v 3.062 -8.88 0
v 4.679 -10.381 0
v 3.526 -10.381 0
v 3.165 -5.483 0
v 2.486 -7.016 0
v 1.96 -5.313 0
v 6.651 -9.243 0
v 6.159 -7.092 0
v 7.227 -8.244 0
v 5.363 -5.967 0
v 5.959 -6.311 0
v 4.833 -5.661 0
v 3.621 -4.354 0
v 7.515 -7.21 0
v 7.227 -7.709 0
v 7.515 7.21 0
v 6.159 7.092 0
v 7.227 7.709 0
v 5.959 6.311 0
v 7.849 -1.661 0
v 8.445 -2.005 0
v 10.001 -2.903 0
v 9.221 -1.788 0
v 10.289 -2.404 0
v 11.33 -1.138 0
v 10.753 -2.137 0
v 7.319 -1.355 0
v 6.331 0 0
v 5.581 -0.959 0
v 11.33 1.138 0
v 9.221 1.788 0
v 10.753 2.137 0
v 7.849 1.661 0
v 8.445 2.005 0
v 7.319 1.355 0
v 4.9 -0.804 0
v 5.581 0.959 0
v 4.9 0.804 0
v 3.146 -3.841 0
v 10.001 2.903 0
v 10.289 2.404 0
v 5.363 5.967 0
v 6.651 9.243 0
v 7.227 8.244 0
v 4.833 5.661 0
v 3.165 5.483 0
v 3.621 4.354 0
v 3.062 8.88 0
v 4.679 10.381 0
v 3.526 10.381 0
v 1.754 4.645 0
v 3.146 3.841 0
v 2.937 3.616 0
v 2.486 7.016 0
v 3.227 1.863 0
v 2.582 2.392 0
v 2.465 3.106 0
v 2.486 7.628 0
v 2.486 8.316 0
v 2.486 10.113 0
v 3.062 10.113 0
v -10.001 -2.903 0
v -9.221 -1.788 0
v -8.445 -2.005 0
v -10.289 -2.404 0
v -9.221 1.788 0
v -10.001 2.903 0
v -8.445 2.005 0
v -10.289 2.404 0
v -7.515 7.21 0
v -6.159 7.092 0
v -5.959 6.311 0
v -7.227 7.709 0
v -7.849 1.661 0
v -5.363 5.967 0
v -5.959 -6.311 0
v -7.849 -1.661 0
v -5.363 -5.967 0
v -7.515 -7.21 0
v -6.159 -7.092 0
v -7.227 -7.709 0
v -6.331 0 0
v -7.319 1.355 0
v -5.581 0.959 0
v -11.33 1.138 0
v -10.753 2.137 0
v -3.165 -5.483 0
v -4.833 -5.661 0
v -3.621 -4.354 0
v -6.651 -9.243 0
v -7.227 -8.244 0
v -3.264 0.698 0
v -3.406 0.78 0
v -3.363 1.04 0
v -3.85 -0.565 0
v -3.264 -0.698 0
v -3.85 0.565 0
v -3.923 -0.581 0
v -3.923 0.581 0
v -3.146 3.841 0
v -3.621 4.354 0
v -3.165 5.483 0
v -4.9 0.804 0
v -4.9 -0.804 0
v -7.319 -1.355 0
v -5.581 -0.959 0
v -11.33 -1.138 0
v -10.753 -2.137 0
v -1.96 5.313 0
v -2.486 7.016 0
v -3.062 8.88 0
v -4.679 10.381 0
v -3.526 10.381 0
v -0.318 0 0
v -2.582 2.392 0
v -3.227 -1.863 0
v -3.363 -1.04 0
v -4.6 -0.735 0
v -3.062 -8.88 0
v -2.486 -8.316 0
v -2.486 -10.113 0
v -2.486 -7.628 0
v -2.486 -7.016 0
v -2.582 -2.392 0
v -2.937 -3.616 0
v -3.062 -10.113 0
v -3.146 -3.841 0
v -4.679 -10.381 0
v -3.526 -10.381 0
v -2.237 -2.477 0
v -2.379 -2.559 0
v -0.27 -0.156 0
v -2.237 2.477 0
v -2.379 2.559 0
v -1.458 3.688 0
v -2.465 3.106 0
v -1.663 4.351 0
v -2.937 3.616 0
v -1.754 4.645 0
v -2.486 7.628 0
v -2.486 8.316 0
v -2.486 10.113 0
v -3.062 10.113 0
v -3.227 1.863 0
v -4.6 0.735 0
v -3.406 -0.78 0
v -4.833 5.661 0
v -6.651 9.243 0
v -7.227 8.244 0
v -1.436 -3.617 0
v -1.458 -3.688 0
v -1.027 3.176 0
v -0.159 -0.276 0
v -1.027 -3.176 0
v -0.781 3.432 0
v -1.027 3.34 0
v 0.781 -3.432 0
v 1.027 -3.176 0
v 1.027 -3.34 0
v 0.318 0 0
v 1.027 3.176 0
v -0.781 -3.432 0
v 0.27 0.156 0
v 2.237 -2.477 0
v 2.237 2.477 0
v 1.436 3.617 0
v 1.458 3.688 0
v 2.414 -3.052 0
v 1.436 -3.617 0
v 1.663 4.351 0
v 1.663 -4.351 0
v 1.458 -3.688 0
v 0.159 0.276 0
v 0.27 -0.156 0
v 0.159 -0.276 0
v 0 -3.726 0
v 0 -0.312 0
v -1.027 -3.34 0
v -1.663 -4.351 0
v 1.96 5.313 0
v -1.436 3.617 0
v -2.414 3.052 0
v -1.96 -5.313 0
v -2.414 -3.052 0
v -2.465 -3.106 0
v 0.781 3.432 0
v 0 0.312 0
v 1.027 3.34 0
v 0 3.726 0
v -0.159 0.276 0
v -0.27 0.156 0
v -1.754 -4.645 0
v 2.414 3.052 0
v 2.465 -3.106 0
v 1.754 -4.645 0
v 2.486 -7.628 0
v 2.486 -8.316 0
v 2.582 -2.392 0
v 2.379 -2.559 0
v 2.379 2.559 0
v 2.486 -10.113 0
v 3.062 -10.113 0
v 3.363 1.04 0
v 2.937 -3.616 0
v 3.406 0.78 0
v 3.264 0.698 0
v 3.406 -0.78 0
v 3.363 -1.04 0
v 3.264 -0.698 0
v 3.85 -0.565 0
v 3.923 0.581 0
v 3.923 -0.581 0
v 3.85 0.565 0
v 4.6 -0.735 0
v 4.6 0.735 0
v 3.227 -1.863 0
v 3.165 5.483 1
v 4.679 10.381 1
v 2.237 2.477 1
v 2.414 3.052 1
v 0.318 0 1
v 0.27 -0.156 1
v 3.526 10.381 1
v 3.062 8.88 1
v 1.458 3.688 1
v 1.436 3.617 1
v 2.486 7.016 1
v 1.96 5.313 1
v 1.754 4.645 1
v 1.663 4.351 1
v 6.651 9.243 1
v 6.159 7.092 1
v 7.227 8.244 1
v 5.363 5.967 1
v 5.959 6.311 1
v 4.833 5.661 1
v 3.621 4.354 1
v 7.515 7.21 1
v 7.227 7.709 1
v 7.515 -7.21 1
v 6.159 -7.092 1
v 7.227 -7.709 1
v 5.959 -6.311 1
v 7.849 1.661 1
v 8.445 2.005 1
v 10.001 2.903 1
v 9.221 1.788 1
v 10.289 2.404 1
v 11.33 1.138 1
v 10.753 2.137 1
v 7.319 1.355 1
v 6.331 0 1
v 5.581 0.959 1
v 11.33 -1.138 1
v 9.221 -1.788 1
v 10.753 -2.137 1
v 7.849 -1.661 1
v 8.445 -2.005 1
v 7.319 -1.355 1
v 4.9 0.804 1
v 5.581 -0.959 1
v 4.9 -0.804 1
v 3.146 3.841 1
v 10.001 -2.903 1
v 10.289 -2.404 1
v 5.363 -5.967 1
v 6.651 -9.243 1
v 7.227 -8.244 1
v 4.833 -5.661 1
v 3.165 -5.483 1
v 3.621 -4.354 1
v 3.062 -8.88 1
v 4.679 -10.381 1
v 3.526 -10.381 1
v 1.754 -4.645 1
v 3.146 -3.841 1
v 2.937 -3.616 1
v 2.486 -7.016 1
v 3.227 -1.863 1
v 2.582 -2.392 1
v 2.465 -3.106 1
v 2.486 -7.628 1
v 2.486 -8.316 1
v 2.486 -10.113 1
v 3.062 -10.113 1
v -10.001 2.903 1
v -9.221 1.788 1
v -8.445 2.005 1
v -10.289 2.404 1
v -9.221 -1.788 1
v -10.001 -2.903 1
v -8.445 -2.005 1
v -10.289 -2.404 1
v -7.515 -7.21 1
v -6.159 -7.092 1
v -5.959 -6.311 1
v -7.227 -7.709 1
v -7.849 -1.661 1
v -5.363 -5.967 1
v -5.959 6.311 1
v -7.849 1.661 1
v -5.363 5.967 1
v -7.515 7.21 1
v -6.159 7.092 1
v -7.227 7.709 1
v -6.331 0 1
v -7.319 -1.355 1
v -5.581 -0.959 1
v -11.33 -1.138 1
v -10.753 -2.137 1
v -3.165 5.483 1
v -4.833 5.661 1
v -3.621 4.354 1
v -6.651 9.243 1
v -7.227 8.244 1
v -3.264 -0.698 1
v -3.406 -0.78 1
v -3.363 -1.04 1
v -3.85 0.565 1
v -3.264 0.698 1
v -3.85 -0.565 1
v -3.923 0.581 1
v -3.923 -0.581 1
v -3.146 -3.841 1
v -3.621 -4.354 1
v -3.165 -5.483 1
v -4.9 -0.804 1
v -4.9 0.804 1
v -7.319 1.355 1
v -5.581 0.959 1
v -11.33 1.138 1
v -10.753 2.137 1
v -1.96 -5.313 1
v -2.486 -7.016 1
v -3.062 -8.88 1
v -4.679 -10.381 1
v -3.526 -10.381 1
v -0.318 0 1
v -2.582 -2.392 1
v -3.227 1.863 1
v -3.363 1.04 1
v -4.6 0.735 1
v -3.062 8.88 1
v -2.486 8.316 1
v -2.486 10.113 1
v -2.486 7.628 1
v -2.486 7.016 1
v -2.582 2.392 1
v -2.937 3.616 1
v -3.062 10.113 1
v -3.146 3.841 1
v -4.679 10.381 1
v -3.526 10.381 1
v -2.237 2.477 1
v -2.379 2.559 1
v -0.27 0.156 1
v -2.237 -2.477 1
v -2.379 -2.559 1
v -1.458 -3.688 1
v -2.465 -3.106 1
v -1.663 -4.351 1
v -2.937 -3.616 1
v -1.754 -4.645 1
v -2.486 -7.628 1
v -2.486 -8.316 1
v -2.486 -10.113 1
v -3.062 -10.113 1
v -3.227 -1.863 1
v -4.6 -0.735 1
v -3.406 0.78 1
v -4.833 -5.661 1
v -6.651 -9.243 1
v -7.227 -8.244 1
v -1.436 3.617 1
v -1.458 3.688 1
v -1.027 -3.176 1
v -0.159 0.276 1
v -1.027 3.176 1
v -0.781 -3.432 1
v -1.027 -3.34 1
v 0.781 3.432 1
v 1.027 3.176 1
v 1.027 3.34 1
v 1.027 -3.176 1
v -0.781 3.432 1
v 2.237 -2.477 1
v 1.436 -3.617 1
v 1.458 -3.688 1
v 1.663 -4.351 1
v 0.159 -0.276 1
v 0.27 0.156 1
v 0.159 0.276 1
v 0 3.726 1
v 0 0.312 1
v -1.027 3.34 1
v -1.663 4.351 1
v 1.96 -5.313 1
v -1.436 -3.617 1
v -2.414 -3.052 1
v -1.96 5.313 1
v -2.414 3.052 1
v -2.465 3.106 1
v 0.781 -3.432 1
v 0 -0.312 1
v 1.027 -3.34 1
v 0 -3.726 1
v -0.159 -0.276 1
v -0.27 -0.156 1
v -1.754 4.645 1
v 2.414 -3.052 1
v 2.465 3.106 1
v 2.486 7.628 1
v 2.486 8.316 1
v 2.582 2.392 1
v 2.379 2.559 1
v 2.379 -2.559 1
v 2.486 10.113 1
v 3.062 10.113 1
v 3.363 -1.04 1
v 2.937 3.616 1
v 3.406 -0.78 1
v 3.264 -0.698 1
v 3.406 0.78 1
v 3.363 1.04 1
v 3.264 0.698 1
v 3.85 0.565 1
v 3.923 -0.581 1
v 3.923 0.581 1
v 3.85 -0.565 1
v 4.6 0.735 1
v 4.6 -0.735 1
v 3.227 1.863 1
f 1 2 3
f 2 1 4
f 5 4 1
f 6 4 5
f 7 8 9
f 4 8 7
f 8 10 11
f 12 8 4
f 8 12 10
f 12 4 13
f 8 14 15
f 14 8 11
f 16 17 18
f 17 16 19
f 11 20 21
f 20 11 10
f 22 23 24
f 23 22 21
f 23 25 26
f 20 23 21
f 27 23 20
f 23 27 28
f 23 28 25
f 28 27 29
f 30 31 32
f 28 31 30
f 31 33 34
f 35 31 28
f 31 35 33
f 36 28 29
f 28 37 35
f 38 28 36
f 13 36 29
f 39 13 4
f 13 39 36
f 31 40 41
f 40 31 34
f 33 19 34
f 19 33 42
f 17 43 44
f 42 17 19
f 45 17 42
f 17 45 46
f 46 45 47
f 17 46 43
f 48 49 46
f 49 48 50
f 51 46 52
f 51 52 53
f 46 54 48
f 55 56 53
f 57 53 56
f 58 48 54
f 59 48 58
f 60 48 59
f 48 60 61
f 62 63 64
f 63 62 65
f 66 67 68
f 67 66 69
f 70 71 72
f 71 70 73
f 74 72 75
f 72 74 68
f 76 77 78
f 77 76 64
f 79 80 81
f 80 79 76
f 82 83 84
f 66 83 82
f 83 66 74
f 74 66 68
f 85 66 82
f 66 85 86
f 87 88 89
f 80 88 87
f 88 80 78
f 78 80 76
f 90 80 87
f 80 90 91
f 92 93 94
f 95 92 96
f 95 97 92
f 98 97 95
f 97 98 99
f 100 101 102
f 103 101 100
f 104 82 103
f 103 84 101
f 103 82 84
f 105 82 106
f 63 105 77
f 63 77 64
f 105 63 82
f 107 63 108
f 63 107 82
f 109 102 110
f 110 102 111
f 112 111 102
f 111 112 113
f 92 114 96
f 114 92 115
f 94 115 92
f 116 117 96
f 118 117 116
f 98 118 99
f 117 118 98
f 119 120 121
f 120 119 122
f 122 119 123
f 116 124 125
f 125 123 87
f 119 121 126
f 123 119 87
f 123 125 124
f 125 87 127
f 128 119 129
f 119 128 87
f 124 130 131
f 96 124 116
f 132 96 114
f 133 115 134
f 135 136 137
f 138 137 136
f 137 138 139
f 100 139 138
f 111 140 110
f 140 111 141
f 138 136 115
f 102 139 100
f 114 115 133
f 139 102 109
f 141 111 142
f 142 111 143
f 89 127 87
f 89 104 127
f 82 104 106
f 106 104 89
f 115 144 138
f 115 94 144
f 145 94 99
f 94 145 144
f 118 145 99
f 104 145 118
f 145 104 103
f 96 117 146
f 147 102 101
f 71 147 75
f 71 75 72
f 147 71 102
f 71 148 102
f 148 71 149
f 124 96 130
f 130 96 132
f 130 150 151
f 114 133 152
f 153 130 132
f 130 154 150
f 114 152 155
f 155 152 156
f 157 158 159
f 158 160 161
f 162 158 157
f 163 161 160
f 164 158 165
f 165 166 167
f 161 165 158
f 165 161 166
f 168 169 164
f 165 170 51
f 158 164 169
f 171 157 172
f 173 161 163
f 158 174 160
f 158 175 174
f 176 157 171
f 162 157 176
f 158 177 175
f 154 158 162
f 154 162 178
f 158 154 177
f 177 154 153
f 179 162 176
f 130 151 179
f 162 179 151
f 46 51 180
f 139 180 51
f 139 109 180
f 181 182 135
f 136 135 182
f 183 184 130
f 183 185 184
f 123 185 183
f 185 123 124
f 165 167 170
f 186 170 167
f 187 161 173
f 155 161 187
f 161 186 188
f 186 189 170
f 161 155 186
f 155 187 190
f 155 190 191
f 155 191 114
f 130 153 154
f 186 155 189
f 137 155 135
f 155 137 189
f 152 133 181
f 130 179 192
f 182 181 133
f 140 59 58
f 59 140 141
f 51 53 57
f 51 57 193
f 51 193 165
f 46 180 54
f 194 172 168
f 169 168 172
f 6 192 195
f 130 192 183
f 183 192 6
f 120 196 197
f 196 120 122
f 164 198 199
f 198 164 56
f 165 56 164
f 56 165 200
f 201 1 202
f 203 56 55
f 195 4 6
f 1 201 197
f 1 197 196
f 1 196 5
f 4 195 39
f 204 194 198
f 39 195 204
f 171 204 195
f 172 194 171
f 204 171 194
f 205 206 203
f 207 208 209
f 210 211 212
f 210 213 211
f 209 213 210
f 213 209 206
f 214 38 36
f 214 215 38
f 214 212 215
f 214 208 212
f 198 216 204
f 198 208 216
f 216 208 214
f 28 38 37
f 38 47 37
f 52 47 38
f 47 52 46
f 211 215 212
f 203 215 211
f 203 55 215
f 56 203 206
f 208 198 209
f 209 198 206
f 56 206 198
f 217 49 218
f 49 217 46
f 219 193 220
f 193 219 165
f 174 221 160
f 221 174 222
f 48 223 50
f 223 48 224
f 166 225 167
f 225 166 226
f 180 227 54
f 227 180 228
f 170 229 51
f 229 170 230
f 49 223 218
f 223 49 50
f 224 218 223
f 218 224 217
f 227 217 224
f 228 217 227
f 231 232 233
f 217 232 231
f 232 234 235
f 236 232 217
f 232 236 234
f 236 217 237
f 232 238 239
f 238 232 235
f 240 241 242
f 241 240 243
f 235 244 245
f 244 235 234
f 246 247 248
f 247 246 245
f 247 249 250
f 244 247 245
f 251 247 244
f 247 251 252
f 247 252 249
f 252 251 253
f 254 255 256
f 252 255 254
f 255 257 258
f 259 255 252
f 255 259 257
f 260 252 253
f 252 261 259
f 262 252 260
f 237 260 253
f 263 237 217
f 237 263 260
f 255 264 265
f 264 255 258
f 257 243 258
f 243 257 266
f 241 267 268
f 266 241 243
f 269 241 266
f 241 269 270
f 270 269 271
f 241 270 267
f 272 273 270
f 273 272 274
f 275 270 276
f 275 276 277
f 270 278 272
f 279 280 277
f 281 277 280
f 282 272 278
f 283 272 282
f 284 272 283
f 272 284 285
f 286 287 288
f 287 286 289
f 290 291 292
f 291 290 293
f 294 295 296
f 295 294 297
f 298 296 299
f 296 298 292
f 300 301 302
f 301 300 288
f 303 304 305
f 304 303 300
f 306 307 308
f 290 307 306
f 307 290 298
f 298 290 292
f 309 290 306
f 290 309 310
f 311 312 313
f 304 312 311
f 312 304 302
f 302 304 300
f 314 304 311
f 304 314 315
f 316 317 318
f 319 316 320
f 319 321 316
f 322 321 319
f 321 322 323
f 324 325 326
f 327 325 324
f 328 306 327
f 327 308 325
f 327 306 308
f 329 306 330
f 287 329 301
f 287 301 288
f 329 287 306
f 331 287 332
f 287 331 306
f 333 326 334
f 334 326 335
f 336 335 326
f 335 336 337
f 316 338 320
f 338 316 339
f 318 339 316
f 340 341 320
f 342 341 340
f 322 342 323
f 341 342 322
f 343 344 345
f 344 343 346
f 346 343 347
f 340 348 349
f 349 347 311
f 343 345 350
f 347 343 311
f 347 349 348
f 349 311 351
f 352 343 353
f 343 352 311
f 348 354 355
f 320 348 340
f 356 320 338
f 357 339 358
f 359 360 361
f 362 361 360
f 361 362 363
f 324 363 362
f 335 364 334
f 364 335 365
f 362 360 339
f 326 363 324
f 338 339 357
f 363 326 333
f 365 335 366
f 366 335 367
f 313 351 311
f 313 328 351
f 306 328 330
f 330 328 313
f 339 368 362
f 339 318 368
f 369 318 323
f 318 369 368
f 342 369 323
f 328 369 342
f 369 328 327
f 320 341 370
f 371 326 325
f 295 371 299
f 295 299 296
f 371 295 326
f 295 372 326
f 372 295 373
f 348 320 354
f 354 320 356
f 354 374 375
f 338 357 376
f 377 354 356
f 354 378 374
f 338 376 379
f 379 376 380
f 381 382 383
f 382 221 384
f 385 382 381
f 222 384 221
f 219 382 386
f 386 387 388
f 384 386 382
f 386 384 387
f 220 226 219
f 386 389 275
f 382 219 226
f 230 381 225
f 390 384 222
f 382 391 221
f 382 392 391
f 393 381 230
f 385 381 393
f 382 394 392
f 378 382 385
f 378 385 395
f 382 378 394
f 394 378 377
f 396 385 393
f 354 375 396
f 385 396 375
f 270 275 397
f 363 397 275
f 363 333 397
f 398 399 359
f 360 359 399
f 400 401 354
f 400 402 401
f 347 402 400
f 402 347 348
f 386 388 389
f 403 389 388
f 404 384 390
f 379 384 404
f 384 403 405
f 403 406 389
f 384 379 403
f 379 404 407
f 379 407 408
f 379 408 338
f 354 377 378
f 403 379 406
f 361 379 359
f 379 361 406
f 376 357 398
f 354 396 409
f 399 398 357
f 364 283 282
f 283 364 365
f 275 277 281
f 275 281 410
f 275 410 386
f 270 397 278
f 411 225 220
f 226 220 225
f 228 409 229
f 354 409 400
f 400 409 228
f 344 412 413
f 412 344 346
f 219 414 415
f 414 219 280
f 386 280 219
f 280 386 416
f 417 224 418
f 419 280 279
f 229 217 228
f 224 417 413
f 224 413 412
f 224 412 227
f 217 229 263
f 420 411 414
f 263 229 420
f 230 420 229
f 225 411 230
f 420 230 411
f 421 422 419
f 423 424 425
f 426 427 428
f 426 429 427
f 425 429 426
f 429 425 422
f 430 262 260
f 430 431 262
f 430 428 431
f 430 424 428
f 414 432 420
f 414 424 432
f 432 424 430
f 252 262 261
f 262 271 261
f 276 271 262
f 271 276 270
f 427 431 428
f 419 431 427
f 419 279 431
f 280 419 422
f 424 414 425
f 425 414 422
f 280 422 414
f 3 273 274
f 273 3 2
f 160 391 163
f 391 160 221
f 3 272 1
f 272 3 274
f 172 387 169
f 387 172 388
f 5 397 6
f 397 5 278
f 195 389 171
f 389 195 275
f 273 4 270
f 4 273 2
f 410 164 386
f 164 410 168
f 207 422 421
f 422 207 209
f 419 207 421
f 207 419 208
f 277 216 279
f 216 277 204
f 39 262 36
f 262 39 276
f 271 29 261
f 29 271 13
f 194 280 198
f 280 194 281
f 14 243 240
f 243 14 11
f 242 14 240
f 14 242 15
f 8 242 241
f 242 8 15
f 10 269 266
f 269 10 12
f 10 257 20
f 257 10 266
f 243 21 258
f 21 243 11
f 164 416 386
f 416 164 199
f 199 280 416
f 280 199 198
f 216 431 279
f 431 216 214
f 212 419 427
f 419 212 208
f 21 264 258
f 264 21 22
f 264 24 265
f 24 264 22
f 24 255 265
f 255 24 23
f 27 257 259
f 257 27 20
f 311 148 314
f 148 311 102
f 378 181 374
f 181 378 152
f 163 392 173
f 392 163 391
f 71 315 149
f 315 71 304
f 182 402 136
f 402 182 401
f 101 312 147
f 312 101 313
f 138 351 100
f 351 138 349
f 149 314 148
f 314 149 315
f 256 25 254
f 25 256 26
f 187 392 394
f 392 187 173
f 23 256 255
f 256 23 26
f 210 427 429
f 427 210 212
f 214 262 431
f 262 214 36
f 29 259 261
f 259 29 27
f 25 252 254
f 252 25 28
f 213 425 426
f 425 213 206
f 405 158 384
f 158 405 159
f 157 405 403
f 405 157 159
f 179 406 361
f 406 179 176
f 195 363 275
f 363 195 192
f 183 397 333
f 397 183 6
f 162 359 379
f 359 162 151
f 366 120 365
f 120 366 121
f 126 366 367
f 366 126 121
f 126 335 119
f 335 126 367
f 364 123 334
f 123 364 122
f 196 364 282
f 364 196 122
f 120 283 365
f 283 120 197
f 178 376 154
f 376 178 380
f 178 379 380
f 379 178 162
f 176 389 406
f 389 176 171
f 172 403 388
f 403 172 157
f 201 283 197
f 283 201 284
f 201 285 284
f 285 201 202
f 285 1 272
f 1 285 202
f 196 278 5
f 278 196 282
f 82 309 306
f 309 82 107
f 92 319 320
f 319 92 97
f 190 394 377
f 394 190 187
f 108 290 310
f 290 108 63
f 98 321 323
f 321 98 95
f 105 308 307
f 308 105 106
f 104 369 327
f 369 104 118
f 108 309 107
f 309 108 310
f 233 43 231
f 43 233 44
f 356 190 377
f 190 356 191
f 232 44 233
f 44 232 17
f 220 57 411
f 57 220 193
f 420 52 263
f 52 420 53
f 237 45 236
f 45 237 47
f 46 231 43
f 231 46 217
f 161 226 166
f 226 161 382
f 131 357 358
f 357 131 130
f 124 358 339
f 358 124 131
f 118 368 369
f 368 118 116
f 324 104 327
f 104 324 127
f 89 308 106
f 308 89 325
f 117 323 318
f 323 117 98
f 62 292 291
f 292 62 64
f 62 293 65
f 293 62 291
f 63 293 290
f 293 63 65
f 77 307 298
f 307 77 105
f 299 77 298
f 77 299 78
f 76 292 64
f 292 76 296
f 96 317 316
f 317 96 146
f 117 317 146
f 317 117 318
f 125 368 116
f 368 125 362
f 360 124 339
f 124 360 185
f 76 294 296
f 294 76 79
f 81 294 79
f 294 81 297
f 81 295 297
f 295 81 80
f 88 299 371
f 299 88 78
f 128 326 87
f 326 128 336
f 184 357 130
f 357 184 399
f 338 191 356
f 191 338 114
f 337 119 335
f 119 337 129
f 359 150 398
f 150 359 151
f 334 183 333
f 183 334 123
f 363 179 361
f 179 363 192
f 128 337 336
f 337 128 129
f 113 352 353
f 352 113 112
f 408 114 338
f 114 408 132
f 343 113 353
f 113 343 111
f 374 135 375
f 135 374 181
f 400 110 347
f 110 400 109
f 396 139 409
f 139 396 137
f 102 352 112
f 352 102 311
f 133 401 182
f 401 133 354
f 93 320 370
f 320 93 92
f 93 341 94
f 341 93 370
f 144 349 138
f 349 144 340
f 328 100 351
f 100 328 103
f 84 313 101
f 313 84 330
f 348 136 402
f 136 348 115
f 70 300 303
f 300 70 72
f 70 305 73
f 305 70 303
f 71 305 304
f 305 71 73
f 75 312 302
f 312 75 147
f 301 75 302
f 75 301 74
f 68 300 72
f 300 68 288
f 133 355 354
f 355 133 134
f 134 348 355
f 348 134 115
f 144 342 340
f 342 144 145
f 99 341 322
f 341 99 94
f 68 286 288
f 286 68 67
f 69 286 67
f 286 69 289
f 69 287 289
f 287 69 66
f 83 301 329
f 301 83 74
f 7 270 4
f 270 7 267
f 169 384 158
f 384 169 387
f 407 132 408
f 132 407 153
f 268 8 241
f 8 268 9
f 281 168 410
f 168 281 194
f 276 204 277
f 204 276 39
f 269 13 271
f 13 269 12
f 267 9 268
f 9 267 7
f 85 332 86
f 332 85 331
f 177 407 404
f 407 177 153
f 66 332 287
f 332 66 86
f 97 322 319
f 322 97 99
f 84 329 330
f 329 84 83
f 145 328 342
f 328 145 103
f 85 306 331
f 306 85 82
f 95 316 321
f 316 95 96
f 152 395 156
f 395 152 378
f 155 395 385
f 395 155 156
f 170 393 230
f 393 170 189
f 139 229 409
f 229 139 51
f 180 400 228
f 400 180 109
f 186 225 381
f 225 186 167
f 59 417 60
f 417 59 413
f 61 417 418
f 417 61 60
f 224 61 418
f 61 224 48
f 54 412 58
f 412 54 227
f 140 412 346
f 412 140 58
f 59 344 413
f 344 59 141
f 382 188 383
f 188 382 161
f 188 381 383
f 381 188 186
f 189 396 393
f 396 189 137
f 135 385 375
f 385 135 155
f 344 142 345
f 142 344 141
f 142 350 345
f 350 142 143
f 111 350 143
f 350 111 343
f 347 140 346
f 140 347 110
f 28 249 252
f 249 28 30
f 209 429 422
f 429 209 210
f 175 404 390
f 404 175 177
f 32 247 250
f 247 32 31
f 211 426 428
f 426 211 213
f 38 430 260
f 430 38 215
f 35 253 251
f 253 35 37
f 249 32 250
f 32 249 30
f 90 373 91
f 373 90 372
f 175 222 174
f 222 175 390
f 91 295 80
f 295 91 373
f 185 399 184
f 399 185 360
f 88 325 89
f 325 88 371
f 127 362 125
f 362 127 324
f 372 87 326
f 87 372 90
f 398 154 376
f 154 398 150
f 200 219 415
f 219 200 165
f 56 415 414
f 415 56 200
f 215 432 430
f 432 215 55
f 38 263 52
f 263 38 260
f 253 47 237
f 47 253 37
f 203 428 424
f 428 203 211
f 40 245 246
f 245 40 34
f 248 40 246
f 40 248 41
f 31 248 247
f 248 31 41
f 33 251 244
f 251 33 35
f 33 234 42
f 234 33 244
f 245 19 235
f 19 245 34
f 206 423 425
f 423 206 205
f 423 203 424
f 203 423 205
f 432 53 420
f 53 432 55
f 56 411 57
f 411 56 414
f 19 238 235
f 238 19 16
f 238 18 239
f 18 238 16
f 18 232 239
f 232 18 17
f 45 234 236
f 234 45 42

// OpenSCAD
// preview[view:south, tilt:top]
/* [Main Text] */
//To input the backslash type '\\'
main_text = "/";
main_text_size = 10;
main_text_vertical_offset = -1;
//See http://www.google.com/fonts. Handwriting fonts look the best for this thing.
main_font = "Great Vibes"; //[ABeeZee,Abel,Abril Fatface,Aclonica,Acme,Actor,Adamina,Advent Pro,Aguafina Script,Akronim,Aladin,Aldrich,Alef,Alegreya,Alegreya Sans,Alegreya Sans SC,Alegreya SC,Alex Brush,Alfa Slab One,Alice,Alike,Alike Angular,Allan,Allerta,Allerta Stencil,Allura,Almendra,Almendra Display,Almendra SC,Amarante,Amaranth,Amatic SC,Amethysta,Amiri,Anaheim,Andada,Andada SC,Andika,Angkor,Annie Use Your Telescope,Anonymous Pro,Antic,Antic Didone,Antic Slab,Anton,Antonio,Arapey,Arbutus,Arbutus Slab,Architects Daughter,Archivo Black,Archivo Narrow,Arimo,Arizonia,Armata,Artifika,Arvo,Asap,Asset,Astloch,Asul,Atomic Age,Aubrey,Audiowide,Autour One,Average,Average Sans,Averia Gruesa Libre,Averia Libre,Averia Sans Libre,Averia Serif Libre,Bad Script,Balthazar,Bangers,Basic,Battambang,Baumans,Bayon,Belgrano,Belleza,BenchNine,Bentham,Berkshire Swash,Bevan,Bhavuka,Bigelow Rules,Bigshot One,Bilbo,Bilbo Swash Caps,Bitter,Black Ops One,Bokor,Bonbon,Boogaloo,Bowlby One,Bowlby One SC,Brawler,Bree Serif,Bruno Ace,Bruno Ace SC,Bubblegum Sans,Bubbler One,Buda,Buenard,Butcherman,Butcherman Caps,Butterfly Kids,Cabin,Cabin Condensed,Cabin Sketch,Caesar Dressing,Cagliostro,Calligraffitti,Cambay,Cambo,Candal,Cantarell,Cantata One,Cantora One,Capriola,Cardo,Carme,Carrois Gothic,Carrois Gothic SC,Carter One,Caudex,Cedarville Cursive,Ceviche One,Changa,Changa One,Chango,Chau Philomene One,Chela One,Chelsea Market,Chenla,Cherry Cream Soda,Cherry Swash,Chewy,Chicle,Chivo,Cinzel,Cinzel Decorative,Clara,Clicker Script,Coda,Coda Caption,Codystar,Combo,Comfortaa,Coming Soon,Concert One,Condiment,Content,Contrail One,Convergence,Cookie,Copse,Corben,Courgette,Cousine,Coustard,Covered By Your Grace,Crafty Girls,Creepster,Creepster Caps,Crete Round,Crimson Text,Croissant One,Crushed,Cuprum,Cutive,Cutive Mono,Damion,Dancing Script,Dangrek,Dawning of a New Day,Days One,Dekko,Delius,Delius Swash Caps,Delius Unicase,Della Respira,Denk One,Devonshire,Dhurjati,Dhyana,Didact Gothic,Dinah,Diplomata,Diplomata SC,Domine,Donegal One,Doppio One,Dorsa,Dosis,Droid Arabic Kufi,Droid Arabic Naskh,Droid Sans,Droid Sans Ethiopic,Droid Sans Mono,Droid Sans Thai,Droid Serif,Droid Serif Thai,Dr Sugiyama,Duru Sans,Dynalight,Eagle Lake,Eater,Eater Caps,EB Garamond,Economica,Eczar,Ek Mukta,Electrolize,Elsie,Elsie Swash Caps,Emblema One,Emilys Candy,Encode Sans,Encode Sans Compressed,Encode Sans Condensed,Encode Sans Narrow,Encode Sans Wide,Engagement,Englebert,Enriqueta,Erica One,Esteban,Euphoria Script,Ewert,Exo,Exo 2,Expletus Sans,Fanwood Text,Fascinate,Fascinate Inline,Faster One,Fasthand,Fauna One,Federant,Federo,Felipa,Fenix,Finger Paint,Fira Mono,Fira Sans,Fjalla One,Fjord One,Flamenco,Flavors,Fondamento,Fontdiner Swanky,Forum,Francois One,Freckle Face,Fredericka the Great,Fredoka One,Freehand,Fresca,Frijole,Fruktur,Fugaz One,Gabriela,Gafata,Galdeano,Galindo,Gentium Basic,Gentium Book Basic,Geo,Geostar,Geostar Fill,Germania One,GFS Didot,GFS Neohellenic,Gidugu,Gilda Display,Give You Glory,Glass Antiqua,Glegoo,Gloria Hallelujah,Goblin One,Gochi Hand,Gorditas,Goudy Bookletter 1911,Graduate,Grand Hotel,Gravitas One,Great Vibes,Griffy,Gruppo,Gudea,Gurajada,Habibi,Halant,Hammersmith One,Hanalei,Hanalei Fill,Handlee,Hanuman,Happy Monkey,Headland One,Henny Penny,Hermeneus One,Herr Von Muellerhoff,Hind,Holtwood One SC,Homemade Apple,Homenaje,Iceberg,Iceland,IM Fell Double Pica,IM Fell Double Pica SC,IM Fell DW Pica,IM Fell DW Pica SC,IM Fell English,IM Fell English SC,IM Fell French Canon,IM Fell French Canon SC,IM Fell Great Primer,IM Fell Great Primer SC,Imprima,Inconsolata,Inder,Indie Flower,Inika,Inknut Antiqua,Irish Grover,Irish Growler,Istok Web,Italiana,Italianno,Jacques Francois,Jacques Francois Shadow,Jaldi,Jim Nightshade,Jockey One,Jolly Lodger,Josefin Sans,Josefin Sans Std Light,Josefin Slab,Joti One,Judson,Julee,Julius Sans One,Junge,Jura,Just Another Hand,Just Me Again Down Here,Kadwa,Kalam,Kameron,Kantumruy,Karla,Karla Tamil Inclined,Karla Tamil Upright,Karma,Kaushan Script,Kavoon,Kdam Thmor,Keania One,Kelly Slab,Kenia,Khand,Khmer,Khula,Kite One,Knewave,Kotta One,Koulen,Kranky,Kreon,Kristi,Krona One,La Belle Aurore,Laila,Lakki Reddy,Lancelot,Lateef,Lato,League Script,Leckerli One,Ledger,Lekton,Lemon,Lemon One,Liberation Sans ,Libre Baskerville,Libre Caslon Text,Life Savers,Lilita One,Lily Script One,Limelight,Linden Hill,Lobster,Lobster Two,Lohit Bengali,Lohit Tamil,Londrina Outline,Londrina Shadow,Londrina Sketch,Londrina Solid,Lora,Loved by the King,Lovers Quarrel,Love Ya Like A Sister,Luckiest Guy,Lusitana,Lustria,Macondo,Macondo Swash Caps,Magra,Maiden Orange,Mako,Mallanna,Mandali,Marcellus,Marcellus SC,Marck Script,Margarine,Marko One,Marmelad,Martel Sans,Marvel,Mate,Mate SC,Maven Pro,McLaren,Meddon,MedievalSharp,Medula One,Megrim,Meie Script,Merge One,Merienda,Merienda One,Merriweather,Merriweather Sans,Mervale Script,Metal,Metal Mania,Metamorphous,Metrophobic,Miama,Michroma,Milonga,Miltonian,Miltonian Tattoo,Miniver,Miss Fajardose,Miss Saint Delafield,Modak,Modern Antiqua,Molengo,Molle,Monda,Monofett,Monoton,Monsieur La Doulaise,Montaga,Montez,Montserrat,Montserrat Alternates,Montserrat Subrayada,Moul,Moulpali,Mountains of Christmas,Mouse Memoirs,Mr Bedford,Mr Bedfort,Mr Dafoe,Mr De Haviland,Mrs Sheppards,Mrs Saint Delafield,Muli,Mystery Quest,Nanum Brush Script,Nanum Gothic,Nanum Gothic Coding,Nanum Myeongjo,Nanum Pen Script,NATS,Neucha,Neuton,New Rocker,News Cycle,Niconne,Nixie One,Nobile,Nokora,Norican,Nosifer,Nosifer Caps,Nothing You Could Do,Noticia Text,Noto Sans,Noto Sans Hebrew,Noto Sans Symbols,Noto Sans UI,Noto Serif,Nova Cut,Nova Flat,Nova Mono,Nova Oval,Nova Round,Nova Script,Nova Slim,Nova Square,NTR,Numans,Nunito,Odor Mean Chey,Offside,OFL Sorts Mill Goudy TT,Oldenburg,Old Standard TT,Oleo Script,Oleo Script Swash Caps,Open Sans,Open Sans Condensed,Oranienbaum,Orbitron,Oregano,Orienta,Original Surfer,Oswald,Overlock,Overlock SC,Over the Rainbow,Ovo,Oxygen,Oxygen Mono,Pacifico,Palanquin,Palanquin Dark,Paprika,Parisienne,Passero One,Passion One,Pathway Gothic One,Patrick Hand,Patrick Hand SC,Patua One,Paytone One,Pecita,Peddana,Peralta,Permanent Marker,Petit Formal Script,Petrona,Phetsarath,Philosopher,Piedra,Pinyon Script,Pirata One,Plaster,Play,Playball,Playfair Display,Playfair Display SC,Podkova,Poetsen One,Poiret One,Poller One,Poly,Pompiere,Ponnala,Pontano Sans,Poppins,Porter Sans Block,Port Lligat Sans,Port Lligat Slab,Prata,Preahvihear,Press Start 2P,Princess Sofia,Prociono,Prosto One,PT Mono,PT Sans,PT Sans Caption,PT Sans Narrow,PT Serif,PT Serif Caption,Puralecka Narrow,Puritan,Purple Purse,Quando,Quantico,Quattrocento,Quattrocento Sans,Questrial,Quicksand,Quintessential,Qwigley,Racing Sans One,Radley,Rajdhani,Raleway,Raleway Dots,Ramabhadra,Ramaraja,Rambla,Rammetto One,Ranchers,Rancho,Ranga,Rationale,Ravi Prakash,Redacted,Redacted Script,Redressed,Reenie Beanie,Revalia,Ribeye,Ribeye Marrow,Righteous,Risque,Roboto,Roboto Condensed,Roboto Slab,Rochester,Rock Salt,Rokkitt,Romanesco,Ropa Sans,Rosario,Rosarivo,Rouge Script,Rozha One,Rubik Mono One,Rubik One,Ruda,Rufina,Ruge Boogie,Ruluko,Rum Raisin,Ruslan Display,Russo One,Ruthie,Rye,Sacramento,Sail,Salsa,Sanchez,Sancreek,Sansation,Sansita One,Sarabun,Sarala,Sarina,Sarpanch,Satisfy,Scada,Scheherazade,Schoolbell,Seaweed Script,Sedan,Sedan SC,Sevillana,Seymour One,Shadows Into Light,Shadows Into Light Two,Shanti,Share,Share Tech,Share Tech Mono,Shojumaru,Short Stack,Siamreap,Siemreap,Sigmar One,Signika,Signika Negative,Simonetta,Sintony,Sirin Stencil,Six Caps,Skranji,Slabo 13px,Slabo 27px,Slackey,Smokum,Smythe,Sniglet,Snippet,Snowburst One,Sofadi One,Sofia,Sonsie One,Sorts Mill Goudy,Source Code Pro,Source Sans Pro,Source Serif Pro,Special Elite,Spicy Rice,Spinnaker,Spirax,Squada One,Sree Krushnadevaraya,Stalemate,Stalinist One,Stalin One,Stardos Stencil,Stint Ultra Condensed,Stint Ultra Expanded,Stoke,Strait,Strong,Sue Ellen Francisco,Sunshiney,Supermercado One,Suranna,Suravaram,Suwannaphum,Swanky and Moo Moo,Syncopate,Tangerine,Taprom,Tauri,Teko,Telex,Tenali Ramakrishna,Tenor Sans,Terminal Dosis,Terminal Dosis Light,Text Me One,Thabit,The Girl Next Door,Tienne,Tillana,Timmana,Tinos,Titan One,Titillium Web,Trade Winds,Trocchi,Trochut,Trykker,Tuffy,Tulpen One,Ubuntu,Ubuntu Condensed,Ubuntu Mono,Ultra,Uncial Antiqua,Underdog,Unica One,UnifrakturCook,UnifrakturMaguntia,Unkempt,Unlock,Unna,Vampiro One,Varela,Varela Round,Vast Shadow,Vesper Libre,Vibur,Vidaloka,Viga,Voces,Volkhov,Vollkorn,Voltaire,VT323,Waiting for the Sunrise,Wallpoet,Walter Turncoat,Warnes,Wellfleet,Wendy One,Wire One,Yanone Kaffeesatz,Yellowtail,Yeseva One,Yesteryear,Zeyada]
main_text_style =  "";//[:Normal,style=Italic:Italic,style=Bold:Bold]
/* [Additional Text] */
//To input the backslash type '\\'
additional_text = "MT";
additional_text_size = 5;
additional_text_vertical_offset = -2;
//See http://www.google.com/fonts. Handwriting fonts look the best for this thing.
additional_font = "Great Vibes"; //[ABeeZee,Abel,Abril Fatface,Aclonica,Acme,Actor,Adamina,Advent Pro,Aguafina Script,Akronim,Aladin,Aldrich,Alef,Alegreya,Alegreya Sans,Alegreya Sans SC,Alegreya SC,Alex Brush,Alfa Slab One,Alice,Alike,Alike Angular,Allan,Allerta,Allerta Stencil,Allura,Almendra,Almendra Display,Almendra SC,Amarante,Amaranth,Amatic SC,Amethysta,Amiri,Anaheim,Andada,Andada SC,Andika,Angkor,Annie Use Your Telescope,Anonymous Pro,Antic,Antic Didone,Antic Slab,Anton,Antonio,Arapey,Arbutus,Arbutus Slab,Architects Daughter,Archivo Black,Archivo Narrow,Arimo,Arizonia,Armata,Artifika,Arvo,Asap,Asset,Astloch,Asul,Atomic Age,Aubrey,Audiowide,Autour One,Average,Average Sans,Averia Gruesa Libre,Averia Libre,Averia Sans Libre,Averia Serif Libre,Bad Script,Balthazar,Bangers,Basic,Battambang,Baumans,Bayon,Belgrano,Belleza,BenchNine,Bentham,Berkshire Swash,Bevan,Bhavuka,Bigelow Rules,Bigshot One,Bilbo,Bilbo Swash Caps,Bitter,Black Ops One,Bokor,Bonbon,Boogaloo,Bowlby One,Bowlby One SC,Brawler,Bree Serif,Bruno Ace,Bruno Ace SC,Bubblegum Sans,Bubbler One,Buda,Buenard,Butcherman,Butcherman Caps,Butterfly Kids,Cabin,Cabin Condensed,Cabin Sketch,Caesar Dressing,Cagliostro,Calligraffitti,Cambay,Cambo,Candal,Cantarell,Cantata One,Cantora One,Capriola,Cardo,Carme,Carrois Gothic,Carrois Gothic SC,Carter One,Caudex,Cedarville Cursive,Ceviche One,Changa,Changa One,Chango,Chau Philomene One,Chela One,Chelsea Market,Chenla,Cherry Cream Soda,Cherry Swash,Chewy,Chicle,Chivo,Cinzel,Cinzel Decorative,Clara,Clicker Script,Coda,Coda Caption,Codystar,Combo,Comfortaa,Coming Soon,Concert One,Condiment,Content,Contrail One,Convergence,Cookie,Copse,Corben,Courgette,Cousine,Coustard,Covered By Your Grace,Crafty Girls,Creepster,Creepster Caps,Crete Round,Crimson Text,Croissant One,Crushed,Cuprum,Cutive,Cutive Mono,Damion,Dancing Script,Dangrek,Dawning of a New Day,Days One,Dekko,Delius,Delius Swash Caps,Delius Unicase,Della Respira,Denk One,Devonshire,Dhurjati,Dhyana,Didact Gothic,Dinah,Diplomata,Diplomata SC,Domine,Donegal One,Doppio One,Dorsa,Dosis,Droid Arabic Kufi,Droid Arabic Naskh,Droid Sans,Droid Sans Ethiopic,Droid Sans Mono,Droid Sans Thai,Droid Serif,Droid Serif Thai,Dr Sugiyama,Duru Sans,Dynalight,Eagle Lake,Eater,Eater Caps,EB Garamond,Economica,Eczar,Ek Mukta,Electrolize,Elsie,Elsie Swash Caps,Emblema One,Emilys Candy,Encode Sans,Encode Sans Compressed,Encode Sans Condensed,Encode Sans Narrow,Encode Sans Wide,Engagement,Englebert,Enriqueta,Erica One,Esteban,Euphoria Script,Ewert,Exo,Exo 2,Expletus Sans,Fanwood Text,Fascinate,Fascinate Inline,Faster One,Fasthand,Fauna One,Federant,Federo,Felipa,Fenix,Finger Paint,Fira Mono,Fira Sans,Fjalla One,Fjord One,Flamenco,Flavors,Fondamento,Fontdiner Swanky,Forum,Francois One,Freckle Face,Fredericka the Great,Fredoka One,Freehand,Fresca,Frijole,Fruktur,Fugaz One,Gabriela,Gafata,Galdeano,Galindo,Gentium Basic,Gentium Book Basic,Geo,Geostar,Geostar Fill,Germania One,GFS Didot,GFS Neohellenic,Gidugu,Gilda Display,Give You Glory,Glass Antiqua,Glegoo,Gloria Hallelujah,Goblin One,Gochi Hand,Gorditas,Goudy Bookletter 1911,Graduate,Grand Hotel,Gravitas One,Great Vibes,Griffy,Gruppo,Gudea,Gurajada,Habibi,Halant,Hammersmith One,Hanalei,Hanalei Fill,Handlee,Hanuman,Happy Monkey,Headland One,Henny Penny,Hermeneus One,Herr Von Muellerhoff,Hind,Holtwood One SC,Homemade Apple,Homenaje,Iceberg,Iceland,IM Fell Double Pica,IM Fell Double Pica SC,IM Fell DW Pica,IM Fell DW Pica SC,IM Fell English,IM Fell English SC,IM Fell French Canon,IM Fell French Canon SC,IM Fell Great Primer,IM Fell Great Primer SC,Imprima,Inconsolata,Inder,Indie Flower,Inika,Inknut Antiqua,Irish Grover,Irish Growler,Istok Web,Italiana,Italianno,Jacques Francois,Jacques Francois Shadow,Jaldi,Jim Nightshade,Jockey One,Jolly Lodger,Josefin Sans,Josefin Sans Std Light,Josefin Slab,Joti One,Judson,Julee,Julius Sans One,Junge,Jura,Just Another Hand,Just Me Again Down Here,Kadwa,Kalam,Kameron,Kantumruy,Karla,Karla Tamil Inclined,Karla Tamil Upright,Karma,Kaushan Script,Kavoon,Kdam Thmor,Keania One,Kelly Slab,Kenia,Khand,Khmer,Khula,Kite One,Knewave,Kotta One,Koulen,Kranky,Kreon,Kristi,Krona One,La Belle Aurore,Laila,Lakki Reddy,Lancelot,Lateef,Lato,League Script,Leckerli One,Ledger,Lekton,Lemon,Lemon One,Liberation Sans ,Libre Baskerville,Libre Caslon Text,Life Savers,Lilita One,Lily Script One,Limelight,Linden Hill,Lobster,Lobster Two,Lohit Bengali,Lohit Tamil,Londrina Outline,Londrina Shadow,Londrina Sketch,Londrina Solid,Lora,Loved by the King,Lovers Quarrel,Love Ya Like A Sister,Luckiest Guy,Lusitana,Lustria,Macondo,Macondo Swash Caps,Magra,Maiden Orange,Mako,Mallanna,Mandali,Marcellus,Marcellus SC,Marck Script,Margarine,Marko One,Marmelad,Martel Sans,Marvel,Mate,Mate SC,Maven Pro,McLaren,Meddon,MedievalSharp,Medula One,Megrim,Meie Script,Merge One,Merienda,Merienda One,Merriweather,Merriweather Sans,Mervale Script,Metal,Metal Mania,Metamorphous,Metrophobic,Miama,Michroma,Milonga,Miltonian,Miltonian Tattoo,Miniver,Miss Fajardose,Miss Saint Delafield,Modak,Modern Antiqua,Molengo,Molle,Monda,Monofett,Monoton,Monsieur La Doulaise,Montaga,Montez,Montserrat,Montserrat Alternates,Montserrat Subrayada,Moul,Moulpali,Mountains of Christmas,Mouse Memoirs,Mr Bedford,Mr Bedfort,Mr Dafoe,Mr De Haviland,Mrs Sheppards,Mrs Saint Delafield,Muli,Mystery Quest,Nanum Brush Script,Nanum Gothic,Nanum Gothic Coding,Nanum Myeongjo,Nanum Pen Script,NATS,Neucha,Neuton,New Rocker,News Cycle,Niconne,Nixie One,Nobile,Nokora,Norican,Nosifer,Nosifer Caps,Nothing You Could Do,Noticia Text,Noto Sans,Noto Sans Hebrew,Noto Sans Symbols,Noto Sans UI,Noto Serif,Nova Cut,Nova Flat,Nova Mono,Nova Oval,Nova Round,Nova Script,Nova Slim,Nova Square,NTR,Numans,Nunito,Odor Mean Chey,Offside,OFL Sorts Mill Goudy TT,Oldenburg,Old Standard TT,Oleo Script,Oleo Script Swash Caps,Open Sans,Open Sans Condensed,Oranienbaum,Orbitron,Oregano,Orienta,Original Surfer,Oswald,Overlock,Overlock SC,Over the Rainbow,Ovo,Oxygen,Oxygen Mono,Pacifico,Palanquin,Palanquin Dark,Paprika,Parisienne,Passero One,Passion One,Pathway Gothic One,Patrick Hand,Patrick Hand SC,Patua One,Paytone One,Pecita,Peddana,Peralta,Permanent Marker,Petit Formal Script,Petrona,Phetsarath,Philosopher,Piedra,Pinyon Script,Pirata One,Plaster,Play,Playball,Playfair Display,Playfair Display SC,Podkova,Poetsen One,Poiret One,Poller One,Poly,Pompiere,Ponnala,Pontano Sans,Poppins,Porter Sans Block,Port Lligat Sans,Port Lligat Slab,Prata,Preahvihear,Press Start 2P,Princess Sofia,Prociono,Prosto One,PT Mono,PT Sans,PT Sans Caption,PT Sans Narrow,PT Serif,PT Serif Caption,Puralecka Narrow,Puritan,Purple Purse,Quando,Quantico,Quattrocento,Quattrocento Sans,Questrial,Quicksand,Quintessential,Qwigley,Racing Sans One,Radley,Rajdhani,Raleway,Raleway Dots,Ramabhadra,Ramaraja,Rambla,Rammetto One,Ranchers,Rancho,Ranga,Rationale,Ravi Prakash,Redacted,Redacted Script,Redressed,Reenie Beanie,Revalia,Ribeye,Ribeye Marrow,Righteous,Risque,Roboto,Roboto Condensed,Roboto Slab,Rochester,Rock Salt,Rokkitt,Romanesco,Ropa Sans,Rosario,Rosarivo,Rouge Script,Rozha One,Rubik Mono One,Rubik One,Ruda,Rufina,Ruge Boogie,Ruluko,Rum Raisin,Ruslan Display,Russo One,Ruthie,Rye,Sacramento,Sail,Salsa,Sanchez,Sancreek,Sansation,Sansita One,Sarabun,Sarala,Sarina,Sarpanch,Satisfy,Scada,Scheherazade,Schoolbell,Seaweed Script,Sedan,Sedan SC,Sevillana,Seymour One,Shadows Into Light,Shadows Into Light Two,Shanti,Share,Share Tech,Share Tech Mono,Shojumaru,Short Stack,Siamreap,Siemreap,Sigmar One,Signika,Signika Negative,Simonetta,Sintony,Sirin Stencil,Six Caps,Skranji,Slabo 13px,Slabo 27px,Slackey,Smokum,Smythe,Sniglet,Snippet,Snowburst One,Sofadi One,Sofia,Sonsie One,Sorts Mill Goudy,Source Code Pro,Source Sans Pro,Source Serif Pro,Special Elite,Spicy Rice,Spinnaker,Spirax,Squada One,Sree Krushnadevaraya,Stalemate,Stalinist One,Stalin One,Stardos Stencil,Stint Ultra Condensed,Stint Ultra Expanded,Stoke,Strait,Strong,Sue Ellen Francisco,Sunshiney,Supermercado One,Suranna,Suravaram,Suwannaphum,Swanky and Moo Moo,Syncopate,Tangerine,Taprom,Tauri,Teko,Telex,Tenali Ramakrishna,Tenor Sans,Terminal Dosis,Terminal Dosis Light,Text Me One,Thabit,The Girl Next Door,Tienne,Tillana,Timmana,Tinos,Titan One,Titillium Web,Trade Winds,Trocchi,Trochut,Trykker,Tuffy,Tulpen One,Ubuntu,Ubuntu Condensed,Ubuntu Mono,Ultra,Uncial Antiqua,Underdog,Unica One,UnifrakturCook,UnifrakturMaguntia,Unkempt,Unlock,Unna,Vampiro One,Varela,Varela Round,Vast Shadow,Vesper Libre,Vibur,Vidaloka,Viga,Voces,Volkhov,Vollkorn,Voltaire,VT323,Waiting for the Sunrise,Wallpoet,Walter Turncoat,Warnes,Wellfleet,Wendy One,Wire One,Yanone Kaffeesatz,Yellowtail,Yeseva One,Yesteryear,Zeyada]
additional_text_style =  "";//[:Normal,style=Italic:Italic,style=Bold:Bold]
/* [Other] */
number_of_branches = 6; //[1:12]
//Snowflake's thickness
height = 1;

Snowflake(main_text, additional_text, main_text_size, additional_text_size, height, main_text_vertical_offset, additional_text_vertical_offset, str(main_font,":",main_text_style), str(additional_font,":",additional_text_style),number_of_branches);

// Module instantiation
module Snowflake(mText = "", aText = "", mSize = 10, aSize = 5, height = 1, mOffset = 0, aOffset=0, mFont, aFont, number=6)
union()
for(i = [1 : 1 : number]){
    rotate([0,0,(360/number)*(i-1)]){
        LetterBlock(mText, mSize, height, mFont, mOffset);
    }
    mirror([0,1,0])
        rotate([0,0,(360/number/2)+(360/number)*(i-1)])
            LetterBlock(aText, aSize, height, aFont, aOffset);
};

// Module definition.
// size=30 defines an optional parameter with a default value.
module LetterBlock(letter, size, height, font, offset) {
    union(){
        translate([0,offset,0])
            linear_extrude(height=height)
                text(letter, 
                     size=size,
                     font=font,
                     halign="left",
                     valign="bottom");
        translate([0,-offset,0])
        mirror([0,1,0])
            linear_extrude(height=height)
                text(letter, 
                     size=size,
                     font=font,
                     halign="left",
                     valign="bottom");
    }
}

// Written by Jexom <jexomwtf@gmail.com>
